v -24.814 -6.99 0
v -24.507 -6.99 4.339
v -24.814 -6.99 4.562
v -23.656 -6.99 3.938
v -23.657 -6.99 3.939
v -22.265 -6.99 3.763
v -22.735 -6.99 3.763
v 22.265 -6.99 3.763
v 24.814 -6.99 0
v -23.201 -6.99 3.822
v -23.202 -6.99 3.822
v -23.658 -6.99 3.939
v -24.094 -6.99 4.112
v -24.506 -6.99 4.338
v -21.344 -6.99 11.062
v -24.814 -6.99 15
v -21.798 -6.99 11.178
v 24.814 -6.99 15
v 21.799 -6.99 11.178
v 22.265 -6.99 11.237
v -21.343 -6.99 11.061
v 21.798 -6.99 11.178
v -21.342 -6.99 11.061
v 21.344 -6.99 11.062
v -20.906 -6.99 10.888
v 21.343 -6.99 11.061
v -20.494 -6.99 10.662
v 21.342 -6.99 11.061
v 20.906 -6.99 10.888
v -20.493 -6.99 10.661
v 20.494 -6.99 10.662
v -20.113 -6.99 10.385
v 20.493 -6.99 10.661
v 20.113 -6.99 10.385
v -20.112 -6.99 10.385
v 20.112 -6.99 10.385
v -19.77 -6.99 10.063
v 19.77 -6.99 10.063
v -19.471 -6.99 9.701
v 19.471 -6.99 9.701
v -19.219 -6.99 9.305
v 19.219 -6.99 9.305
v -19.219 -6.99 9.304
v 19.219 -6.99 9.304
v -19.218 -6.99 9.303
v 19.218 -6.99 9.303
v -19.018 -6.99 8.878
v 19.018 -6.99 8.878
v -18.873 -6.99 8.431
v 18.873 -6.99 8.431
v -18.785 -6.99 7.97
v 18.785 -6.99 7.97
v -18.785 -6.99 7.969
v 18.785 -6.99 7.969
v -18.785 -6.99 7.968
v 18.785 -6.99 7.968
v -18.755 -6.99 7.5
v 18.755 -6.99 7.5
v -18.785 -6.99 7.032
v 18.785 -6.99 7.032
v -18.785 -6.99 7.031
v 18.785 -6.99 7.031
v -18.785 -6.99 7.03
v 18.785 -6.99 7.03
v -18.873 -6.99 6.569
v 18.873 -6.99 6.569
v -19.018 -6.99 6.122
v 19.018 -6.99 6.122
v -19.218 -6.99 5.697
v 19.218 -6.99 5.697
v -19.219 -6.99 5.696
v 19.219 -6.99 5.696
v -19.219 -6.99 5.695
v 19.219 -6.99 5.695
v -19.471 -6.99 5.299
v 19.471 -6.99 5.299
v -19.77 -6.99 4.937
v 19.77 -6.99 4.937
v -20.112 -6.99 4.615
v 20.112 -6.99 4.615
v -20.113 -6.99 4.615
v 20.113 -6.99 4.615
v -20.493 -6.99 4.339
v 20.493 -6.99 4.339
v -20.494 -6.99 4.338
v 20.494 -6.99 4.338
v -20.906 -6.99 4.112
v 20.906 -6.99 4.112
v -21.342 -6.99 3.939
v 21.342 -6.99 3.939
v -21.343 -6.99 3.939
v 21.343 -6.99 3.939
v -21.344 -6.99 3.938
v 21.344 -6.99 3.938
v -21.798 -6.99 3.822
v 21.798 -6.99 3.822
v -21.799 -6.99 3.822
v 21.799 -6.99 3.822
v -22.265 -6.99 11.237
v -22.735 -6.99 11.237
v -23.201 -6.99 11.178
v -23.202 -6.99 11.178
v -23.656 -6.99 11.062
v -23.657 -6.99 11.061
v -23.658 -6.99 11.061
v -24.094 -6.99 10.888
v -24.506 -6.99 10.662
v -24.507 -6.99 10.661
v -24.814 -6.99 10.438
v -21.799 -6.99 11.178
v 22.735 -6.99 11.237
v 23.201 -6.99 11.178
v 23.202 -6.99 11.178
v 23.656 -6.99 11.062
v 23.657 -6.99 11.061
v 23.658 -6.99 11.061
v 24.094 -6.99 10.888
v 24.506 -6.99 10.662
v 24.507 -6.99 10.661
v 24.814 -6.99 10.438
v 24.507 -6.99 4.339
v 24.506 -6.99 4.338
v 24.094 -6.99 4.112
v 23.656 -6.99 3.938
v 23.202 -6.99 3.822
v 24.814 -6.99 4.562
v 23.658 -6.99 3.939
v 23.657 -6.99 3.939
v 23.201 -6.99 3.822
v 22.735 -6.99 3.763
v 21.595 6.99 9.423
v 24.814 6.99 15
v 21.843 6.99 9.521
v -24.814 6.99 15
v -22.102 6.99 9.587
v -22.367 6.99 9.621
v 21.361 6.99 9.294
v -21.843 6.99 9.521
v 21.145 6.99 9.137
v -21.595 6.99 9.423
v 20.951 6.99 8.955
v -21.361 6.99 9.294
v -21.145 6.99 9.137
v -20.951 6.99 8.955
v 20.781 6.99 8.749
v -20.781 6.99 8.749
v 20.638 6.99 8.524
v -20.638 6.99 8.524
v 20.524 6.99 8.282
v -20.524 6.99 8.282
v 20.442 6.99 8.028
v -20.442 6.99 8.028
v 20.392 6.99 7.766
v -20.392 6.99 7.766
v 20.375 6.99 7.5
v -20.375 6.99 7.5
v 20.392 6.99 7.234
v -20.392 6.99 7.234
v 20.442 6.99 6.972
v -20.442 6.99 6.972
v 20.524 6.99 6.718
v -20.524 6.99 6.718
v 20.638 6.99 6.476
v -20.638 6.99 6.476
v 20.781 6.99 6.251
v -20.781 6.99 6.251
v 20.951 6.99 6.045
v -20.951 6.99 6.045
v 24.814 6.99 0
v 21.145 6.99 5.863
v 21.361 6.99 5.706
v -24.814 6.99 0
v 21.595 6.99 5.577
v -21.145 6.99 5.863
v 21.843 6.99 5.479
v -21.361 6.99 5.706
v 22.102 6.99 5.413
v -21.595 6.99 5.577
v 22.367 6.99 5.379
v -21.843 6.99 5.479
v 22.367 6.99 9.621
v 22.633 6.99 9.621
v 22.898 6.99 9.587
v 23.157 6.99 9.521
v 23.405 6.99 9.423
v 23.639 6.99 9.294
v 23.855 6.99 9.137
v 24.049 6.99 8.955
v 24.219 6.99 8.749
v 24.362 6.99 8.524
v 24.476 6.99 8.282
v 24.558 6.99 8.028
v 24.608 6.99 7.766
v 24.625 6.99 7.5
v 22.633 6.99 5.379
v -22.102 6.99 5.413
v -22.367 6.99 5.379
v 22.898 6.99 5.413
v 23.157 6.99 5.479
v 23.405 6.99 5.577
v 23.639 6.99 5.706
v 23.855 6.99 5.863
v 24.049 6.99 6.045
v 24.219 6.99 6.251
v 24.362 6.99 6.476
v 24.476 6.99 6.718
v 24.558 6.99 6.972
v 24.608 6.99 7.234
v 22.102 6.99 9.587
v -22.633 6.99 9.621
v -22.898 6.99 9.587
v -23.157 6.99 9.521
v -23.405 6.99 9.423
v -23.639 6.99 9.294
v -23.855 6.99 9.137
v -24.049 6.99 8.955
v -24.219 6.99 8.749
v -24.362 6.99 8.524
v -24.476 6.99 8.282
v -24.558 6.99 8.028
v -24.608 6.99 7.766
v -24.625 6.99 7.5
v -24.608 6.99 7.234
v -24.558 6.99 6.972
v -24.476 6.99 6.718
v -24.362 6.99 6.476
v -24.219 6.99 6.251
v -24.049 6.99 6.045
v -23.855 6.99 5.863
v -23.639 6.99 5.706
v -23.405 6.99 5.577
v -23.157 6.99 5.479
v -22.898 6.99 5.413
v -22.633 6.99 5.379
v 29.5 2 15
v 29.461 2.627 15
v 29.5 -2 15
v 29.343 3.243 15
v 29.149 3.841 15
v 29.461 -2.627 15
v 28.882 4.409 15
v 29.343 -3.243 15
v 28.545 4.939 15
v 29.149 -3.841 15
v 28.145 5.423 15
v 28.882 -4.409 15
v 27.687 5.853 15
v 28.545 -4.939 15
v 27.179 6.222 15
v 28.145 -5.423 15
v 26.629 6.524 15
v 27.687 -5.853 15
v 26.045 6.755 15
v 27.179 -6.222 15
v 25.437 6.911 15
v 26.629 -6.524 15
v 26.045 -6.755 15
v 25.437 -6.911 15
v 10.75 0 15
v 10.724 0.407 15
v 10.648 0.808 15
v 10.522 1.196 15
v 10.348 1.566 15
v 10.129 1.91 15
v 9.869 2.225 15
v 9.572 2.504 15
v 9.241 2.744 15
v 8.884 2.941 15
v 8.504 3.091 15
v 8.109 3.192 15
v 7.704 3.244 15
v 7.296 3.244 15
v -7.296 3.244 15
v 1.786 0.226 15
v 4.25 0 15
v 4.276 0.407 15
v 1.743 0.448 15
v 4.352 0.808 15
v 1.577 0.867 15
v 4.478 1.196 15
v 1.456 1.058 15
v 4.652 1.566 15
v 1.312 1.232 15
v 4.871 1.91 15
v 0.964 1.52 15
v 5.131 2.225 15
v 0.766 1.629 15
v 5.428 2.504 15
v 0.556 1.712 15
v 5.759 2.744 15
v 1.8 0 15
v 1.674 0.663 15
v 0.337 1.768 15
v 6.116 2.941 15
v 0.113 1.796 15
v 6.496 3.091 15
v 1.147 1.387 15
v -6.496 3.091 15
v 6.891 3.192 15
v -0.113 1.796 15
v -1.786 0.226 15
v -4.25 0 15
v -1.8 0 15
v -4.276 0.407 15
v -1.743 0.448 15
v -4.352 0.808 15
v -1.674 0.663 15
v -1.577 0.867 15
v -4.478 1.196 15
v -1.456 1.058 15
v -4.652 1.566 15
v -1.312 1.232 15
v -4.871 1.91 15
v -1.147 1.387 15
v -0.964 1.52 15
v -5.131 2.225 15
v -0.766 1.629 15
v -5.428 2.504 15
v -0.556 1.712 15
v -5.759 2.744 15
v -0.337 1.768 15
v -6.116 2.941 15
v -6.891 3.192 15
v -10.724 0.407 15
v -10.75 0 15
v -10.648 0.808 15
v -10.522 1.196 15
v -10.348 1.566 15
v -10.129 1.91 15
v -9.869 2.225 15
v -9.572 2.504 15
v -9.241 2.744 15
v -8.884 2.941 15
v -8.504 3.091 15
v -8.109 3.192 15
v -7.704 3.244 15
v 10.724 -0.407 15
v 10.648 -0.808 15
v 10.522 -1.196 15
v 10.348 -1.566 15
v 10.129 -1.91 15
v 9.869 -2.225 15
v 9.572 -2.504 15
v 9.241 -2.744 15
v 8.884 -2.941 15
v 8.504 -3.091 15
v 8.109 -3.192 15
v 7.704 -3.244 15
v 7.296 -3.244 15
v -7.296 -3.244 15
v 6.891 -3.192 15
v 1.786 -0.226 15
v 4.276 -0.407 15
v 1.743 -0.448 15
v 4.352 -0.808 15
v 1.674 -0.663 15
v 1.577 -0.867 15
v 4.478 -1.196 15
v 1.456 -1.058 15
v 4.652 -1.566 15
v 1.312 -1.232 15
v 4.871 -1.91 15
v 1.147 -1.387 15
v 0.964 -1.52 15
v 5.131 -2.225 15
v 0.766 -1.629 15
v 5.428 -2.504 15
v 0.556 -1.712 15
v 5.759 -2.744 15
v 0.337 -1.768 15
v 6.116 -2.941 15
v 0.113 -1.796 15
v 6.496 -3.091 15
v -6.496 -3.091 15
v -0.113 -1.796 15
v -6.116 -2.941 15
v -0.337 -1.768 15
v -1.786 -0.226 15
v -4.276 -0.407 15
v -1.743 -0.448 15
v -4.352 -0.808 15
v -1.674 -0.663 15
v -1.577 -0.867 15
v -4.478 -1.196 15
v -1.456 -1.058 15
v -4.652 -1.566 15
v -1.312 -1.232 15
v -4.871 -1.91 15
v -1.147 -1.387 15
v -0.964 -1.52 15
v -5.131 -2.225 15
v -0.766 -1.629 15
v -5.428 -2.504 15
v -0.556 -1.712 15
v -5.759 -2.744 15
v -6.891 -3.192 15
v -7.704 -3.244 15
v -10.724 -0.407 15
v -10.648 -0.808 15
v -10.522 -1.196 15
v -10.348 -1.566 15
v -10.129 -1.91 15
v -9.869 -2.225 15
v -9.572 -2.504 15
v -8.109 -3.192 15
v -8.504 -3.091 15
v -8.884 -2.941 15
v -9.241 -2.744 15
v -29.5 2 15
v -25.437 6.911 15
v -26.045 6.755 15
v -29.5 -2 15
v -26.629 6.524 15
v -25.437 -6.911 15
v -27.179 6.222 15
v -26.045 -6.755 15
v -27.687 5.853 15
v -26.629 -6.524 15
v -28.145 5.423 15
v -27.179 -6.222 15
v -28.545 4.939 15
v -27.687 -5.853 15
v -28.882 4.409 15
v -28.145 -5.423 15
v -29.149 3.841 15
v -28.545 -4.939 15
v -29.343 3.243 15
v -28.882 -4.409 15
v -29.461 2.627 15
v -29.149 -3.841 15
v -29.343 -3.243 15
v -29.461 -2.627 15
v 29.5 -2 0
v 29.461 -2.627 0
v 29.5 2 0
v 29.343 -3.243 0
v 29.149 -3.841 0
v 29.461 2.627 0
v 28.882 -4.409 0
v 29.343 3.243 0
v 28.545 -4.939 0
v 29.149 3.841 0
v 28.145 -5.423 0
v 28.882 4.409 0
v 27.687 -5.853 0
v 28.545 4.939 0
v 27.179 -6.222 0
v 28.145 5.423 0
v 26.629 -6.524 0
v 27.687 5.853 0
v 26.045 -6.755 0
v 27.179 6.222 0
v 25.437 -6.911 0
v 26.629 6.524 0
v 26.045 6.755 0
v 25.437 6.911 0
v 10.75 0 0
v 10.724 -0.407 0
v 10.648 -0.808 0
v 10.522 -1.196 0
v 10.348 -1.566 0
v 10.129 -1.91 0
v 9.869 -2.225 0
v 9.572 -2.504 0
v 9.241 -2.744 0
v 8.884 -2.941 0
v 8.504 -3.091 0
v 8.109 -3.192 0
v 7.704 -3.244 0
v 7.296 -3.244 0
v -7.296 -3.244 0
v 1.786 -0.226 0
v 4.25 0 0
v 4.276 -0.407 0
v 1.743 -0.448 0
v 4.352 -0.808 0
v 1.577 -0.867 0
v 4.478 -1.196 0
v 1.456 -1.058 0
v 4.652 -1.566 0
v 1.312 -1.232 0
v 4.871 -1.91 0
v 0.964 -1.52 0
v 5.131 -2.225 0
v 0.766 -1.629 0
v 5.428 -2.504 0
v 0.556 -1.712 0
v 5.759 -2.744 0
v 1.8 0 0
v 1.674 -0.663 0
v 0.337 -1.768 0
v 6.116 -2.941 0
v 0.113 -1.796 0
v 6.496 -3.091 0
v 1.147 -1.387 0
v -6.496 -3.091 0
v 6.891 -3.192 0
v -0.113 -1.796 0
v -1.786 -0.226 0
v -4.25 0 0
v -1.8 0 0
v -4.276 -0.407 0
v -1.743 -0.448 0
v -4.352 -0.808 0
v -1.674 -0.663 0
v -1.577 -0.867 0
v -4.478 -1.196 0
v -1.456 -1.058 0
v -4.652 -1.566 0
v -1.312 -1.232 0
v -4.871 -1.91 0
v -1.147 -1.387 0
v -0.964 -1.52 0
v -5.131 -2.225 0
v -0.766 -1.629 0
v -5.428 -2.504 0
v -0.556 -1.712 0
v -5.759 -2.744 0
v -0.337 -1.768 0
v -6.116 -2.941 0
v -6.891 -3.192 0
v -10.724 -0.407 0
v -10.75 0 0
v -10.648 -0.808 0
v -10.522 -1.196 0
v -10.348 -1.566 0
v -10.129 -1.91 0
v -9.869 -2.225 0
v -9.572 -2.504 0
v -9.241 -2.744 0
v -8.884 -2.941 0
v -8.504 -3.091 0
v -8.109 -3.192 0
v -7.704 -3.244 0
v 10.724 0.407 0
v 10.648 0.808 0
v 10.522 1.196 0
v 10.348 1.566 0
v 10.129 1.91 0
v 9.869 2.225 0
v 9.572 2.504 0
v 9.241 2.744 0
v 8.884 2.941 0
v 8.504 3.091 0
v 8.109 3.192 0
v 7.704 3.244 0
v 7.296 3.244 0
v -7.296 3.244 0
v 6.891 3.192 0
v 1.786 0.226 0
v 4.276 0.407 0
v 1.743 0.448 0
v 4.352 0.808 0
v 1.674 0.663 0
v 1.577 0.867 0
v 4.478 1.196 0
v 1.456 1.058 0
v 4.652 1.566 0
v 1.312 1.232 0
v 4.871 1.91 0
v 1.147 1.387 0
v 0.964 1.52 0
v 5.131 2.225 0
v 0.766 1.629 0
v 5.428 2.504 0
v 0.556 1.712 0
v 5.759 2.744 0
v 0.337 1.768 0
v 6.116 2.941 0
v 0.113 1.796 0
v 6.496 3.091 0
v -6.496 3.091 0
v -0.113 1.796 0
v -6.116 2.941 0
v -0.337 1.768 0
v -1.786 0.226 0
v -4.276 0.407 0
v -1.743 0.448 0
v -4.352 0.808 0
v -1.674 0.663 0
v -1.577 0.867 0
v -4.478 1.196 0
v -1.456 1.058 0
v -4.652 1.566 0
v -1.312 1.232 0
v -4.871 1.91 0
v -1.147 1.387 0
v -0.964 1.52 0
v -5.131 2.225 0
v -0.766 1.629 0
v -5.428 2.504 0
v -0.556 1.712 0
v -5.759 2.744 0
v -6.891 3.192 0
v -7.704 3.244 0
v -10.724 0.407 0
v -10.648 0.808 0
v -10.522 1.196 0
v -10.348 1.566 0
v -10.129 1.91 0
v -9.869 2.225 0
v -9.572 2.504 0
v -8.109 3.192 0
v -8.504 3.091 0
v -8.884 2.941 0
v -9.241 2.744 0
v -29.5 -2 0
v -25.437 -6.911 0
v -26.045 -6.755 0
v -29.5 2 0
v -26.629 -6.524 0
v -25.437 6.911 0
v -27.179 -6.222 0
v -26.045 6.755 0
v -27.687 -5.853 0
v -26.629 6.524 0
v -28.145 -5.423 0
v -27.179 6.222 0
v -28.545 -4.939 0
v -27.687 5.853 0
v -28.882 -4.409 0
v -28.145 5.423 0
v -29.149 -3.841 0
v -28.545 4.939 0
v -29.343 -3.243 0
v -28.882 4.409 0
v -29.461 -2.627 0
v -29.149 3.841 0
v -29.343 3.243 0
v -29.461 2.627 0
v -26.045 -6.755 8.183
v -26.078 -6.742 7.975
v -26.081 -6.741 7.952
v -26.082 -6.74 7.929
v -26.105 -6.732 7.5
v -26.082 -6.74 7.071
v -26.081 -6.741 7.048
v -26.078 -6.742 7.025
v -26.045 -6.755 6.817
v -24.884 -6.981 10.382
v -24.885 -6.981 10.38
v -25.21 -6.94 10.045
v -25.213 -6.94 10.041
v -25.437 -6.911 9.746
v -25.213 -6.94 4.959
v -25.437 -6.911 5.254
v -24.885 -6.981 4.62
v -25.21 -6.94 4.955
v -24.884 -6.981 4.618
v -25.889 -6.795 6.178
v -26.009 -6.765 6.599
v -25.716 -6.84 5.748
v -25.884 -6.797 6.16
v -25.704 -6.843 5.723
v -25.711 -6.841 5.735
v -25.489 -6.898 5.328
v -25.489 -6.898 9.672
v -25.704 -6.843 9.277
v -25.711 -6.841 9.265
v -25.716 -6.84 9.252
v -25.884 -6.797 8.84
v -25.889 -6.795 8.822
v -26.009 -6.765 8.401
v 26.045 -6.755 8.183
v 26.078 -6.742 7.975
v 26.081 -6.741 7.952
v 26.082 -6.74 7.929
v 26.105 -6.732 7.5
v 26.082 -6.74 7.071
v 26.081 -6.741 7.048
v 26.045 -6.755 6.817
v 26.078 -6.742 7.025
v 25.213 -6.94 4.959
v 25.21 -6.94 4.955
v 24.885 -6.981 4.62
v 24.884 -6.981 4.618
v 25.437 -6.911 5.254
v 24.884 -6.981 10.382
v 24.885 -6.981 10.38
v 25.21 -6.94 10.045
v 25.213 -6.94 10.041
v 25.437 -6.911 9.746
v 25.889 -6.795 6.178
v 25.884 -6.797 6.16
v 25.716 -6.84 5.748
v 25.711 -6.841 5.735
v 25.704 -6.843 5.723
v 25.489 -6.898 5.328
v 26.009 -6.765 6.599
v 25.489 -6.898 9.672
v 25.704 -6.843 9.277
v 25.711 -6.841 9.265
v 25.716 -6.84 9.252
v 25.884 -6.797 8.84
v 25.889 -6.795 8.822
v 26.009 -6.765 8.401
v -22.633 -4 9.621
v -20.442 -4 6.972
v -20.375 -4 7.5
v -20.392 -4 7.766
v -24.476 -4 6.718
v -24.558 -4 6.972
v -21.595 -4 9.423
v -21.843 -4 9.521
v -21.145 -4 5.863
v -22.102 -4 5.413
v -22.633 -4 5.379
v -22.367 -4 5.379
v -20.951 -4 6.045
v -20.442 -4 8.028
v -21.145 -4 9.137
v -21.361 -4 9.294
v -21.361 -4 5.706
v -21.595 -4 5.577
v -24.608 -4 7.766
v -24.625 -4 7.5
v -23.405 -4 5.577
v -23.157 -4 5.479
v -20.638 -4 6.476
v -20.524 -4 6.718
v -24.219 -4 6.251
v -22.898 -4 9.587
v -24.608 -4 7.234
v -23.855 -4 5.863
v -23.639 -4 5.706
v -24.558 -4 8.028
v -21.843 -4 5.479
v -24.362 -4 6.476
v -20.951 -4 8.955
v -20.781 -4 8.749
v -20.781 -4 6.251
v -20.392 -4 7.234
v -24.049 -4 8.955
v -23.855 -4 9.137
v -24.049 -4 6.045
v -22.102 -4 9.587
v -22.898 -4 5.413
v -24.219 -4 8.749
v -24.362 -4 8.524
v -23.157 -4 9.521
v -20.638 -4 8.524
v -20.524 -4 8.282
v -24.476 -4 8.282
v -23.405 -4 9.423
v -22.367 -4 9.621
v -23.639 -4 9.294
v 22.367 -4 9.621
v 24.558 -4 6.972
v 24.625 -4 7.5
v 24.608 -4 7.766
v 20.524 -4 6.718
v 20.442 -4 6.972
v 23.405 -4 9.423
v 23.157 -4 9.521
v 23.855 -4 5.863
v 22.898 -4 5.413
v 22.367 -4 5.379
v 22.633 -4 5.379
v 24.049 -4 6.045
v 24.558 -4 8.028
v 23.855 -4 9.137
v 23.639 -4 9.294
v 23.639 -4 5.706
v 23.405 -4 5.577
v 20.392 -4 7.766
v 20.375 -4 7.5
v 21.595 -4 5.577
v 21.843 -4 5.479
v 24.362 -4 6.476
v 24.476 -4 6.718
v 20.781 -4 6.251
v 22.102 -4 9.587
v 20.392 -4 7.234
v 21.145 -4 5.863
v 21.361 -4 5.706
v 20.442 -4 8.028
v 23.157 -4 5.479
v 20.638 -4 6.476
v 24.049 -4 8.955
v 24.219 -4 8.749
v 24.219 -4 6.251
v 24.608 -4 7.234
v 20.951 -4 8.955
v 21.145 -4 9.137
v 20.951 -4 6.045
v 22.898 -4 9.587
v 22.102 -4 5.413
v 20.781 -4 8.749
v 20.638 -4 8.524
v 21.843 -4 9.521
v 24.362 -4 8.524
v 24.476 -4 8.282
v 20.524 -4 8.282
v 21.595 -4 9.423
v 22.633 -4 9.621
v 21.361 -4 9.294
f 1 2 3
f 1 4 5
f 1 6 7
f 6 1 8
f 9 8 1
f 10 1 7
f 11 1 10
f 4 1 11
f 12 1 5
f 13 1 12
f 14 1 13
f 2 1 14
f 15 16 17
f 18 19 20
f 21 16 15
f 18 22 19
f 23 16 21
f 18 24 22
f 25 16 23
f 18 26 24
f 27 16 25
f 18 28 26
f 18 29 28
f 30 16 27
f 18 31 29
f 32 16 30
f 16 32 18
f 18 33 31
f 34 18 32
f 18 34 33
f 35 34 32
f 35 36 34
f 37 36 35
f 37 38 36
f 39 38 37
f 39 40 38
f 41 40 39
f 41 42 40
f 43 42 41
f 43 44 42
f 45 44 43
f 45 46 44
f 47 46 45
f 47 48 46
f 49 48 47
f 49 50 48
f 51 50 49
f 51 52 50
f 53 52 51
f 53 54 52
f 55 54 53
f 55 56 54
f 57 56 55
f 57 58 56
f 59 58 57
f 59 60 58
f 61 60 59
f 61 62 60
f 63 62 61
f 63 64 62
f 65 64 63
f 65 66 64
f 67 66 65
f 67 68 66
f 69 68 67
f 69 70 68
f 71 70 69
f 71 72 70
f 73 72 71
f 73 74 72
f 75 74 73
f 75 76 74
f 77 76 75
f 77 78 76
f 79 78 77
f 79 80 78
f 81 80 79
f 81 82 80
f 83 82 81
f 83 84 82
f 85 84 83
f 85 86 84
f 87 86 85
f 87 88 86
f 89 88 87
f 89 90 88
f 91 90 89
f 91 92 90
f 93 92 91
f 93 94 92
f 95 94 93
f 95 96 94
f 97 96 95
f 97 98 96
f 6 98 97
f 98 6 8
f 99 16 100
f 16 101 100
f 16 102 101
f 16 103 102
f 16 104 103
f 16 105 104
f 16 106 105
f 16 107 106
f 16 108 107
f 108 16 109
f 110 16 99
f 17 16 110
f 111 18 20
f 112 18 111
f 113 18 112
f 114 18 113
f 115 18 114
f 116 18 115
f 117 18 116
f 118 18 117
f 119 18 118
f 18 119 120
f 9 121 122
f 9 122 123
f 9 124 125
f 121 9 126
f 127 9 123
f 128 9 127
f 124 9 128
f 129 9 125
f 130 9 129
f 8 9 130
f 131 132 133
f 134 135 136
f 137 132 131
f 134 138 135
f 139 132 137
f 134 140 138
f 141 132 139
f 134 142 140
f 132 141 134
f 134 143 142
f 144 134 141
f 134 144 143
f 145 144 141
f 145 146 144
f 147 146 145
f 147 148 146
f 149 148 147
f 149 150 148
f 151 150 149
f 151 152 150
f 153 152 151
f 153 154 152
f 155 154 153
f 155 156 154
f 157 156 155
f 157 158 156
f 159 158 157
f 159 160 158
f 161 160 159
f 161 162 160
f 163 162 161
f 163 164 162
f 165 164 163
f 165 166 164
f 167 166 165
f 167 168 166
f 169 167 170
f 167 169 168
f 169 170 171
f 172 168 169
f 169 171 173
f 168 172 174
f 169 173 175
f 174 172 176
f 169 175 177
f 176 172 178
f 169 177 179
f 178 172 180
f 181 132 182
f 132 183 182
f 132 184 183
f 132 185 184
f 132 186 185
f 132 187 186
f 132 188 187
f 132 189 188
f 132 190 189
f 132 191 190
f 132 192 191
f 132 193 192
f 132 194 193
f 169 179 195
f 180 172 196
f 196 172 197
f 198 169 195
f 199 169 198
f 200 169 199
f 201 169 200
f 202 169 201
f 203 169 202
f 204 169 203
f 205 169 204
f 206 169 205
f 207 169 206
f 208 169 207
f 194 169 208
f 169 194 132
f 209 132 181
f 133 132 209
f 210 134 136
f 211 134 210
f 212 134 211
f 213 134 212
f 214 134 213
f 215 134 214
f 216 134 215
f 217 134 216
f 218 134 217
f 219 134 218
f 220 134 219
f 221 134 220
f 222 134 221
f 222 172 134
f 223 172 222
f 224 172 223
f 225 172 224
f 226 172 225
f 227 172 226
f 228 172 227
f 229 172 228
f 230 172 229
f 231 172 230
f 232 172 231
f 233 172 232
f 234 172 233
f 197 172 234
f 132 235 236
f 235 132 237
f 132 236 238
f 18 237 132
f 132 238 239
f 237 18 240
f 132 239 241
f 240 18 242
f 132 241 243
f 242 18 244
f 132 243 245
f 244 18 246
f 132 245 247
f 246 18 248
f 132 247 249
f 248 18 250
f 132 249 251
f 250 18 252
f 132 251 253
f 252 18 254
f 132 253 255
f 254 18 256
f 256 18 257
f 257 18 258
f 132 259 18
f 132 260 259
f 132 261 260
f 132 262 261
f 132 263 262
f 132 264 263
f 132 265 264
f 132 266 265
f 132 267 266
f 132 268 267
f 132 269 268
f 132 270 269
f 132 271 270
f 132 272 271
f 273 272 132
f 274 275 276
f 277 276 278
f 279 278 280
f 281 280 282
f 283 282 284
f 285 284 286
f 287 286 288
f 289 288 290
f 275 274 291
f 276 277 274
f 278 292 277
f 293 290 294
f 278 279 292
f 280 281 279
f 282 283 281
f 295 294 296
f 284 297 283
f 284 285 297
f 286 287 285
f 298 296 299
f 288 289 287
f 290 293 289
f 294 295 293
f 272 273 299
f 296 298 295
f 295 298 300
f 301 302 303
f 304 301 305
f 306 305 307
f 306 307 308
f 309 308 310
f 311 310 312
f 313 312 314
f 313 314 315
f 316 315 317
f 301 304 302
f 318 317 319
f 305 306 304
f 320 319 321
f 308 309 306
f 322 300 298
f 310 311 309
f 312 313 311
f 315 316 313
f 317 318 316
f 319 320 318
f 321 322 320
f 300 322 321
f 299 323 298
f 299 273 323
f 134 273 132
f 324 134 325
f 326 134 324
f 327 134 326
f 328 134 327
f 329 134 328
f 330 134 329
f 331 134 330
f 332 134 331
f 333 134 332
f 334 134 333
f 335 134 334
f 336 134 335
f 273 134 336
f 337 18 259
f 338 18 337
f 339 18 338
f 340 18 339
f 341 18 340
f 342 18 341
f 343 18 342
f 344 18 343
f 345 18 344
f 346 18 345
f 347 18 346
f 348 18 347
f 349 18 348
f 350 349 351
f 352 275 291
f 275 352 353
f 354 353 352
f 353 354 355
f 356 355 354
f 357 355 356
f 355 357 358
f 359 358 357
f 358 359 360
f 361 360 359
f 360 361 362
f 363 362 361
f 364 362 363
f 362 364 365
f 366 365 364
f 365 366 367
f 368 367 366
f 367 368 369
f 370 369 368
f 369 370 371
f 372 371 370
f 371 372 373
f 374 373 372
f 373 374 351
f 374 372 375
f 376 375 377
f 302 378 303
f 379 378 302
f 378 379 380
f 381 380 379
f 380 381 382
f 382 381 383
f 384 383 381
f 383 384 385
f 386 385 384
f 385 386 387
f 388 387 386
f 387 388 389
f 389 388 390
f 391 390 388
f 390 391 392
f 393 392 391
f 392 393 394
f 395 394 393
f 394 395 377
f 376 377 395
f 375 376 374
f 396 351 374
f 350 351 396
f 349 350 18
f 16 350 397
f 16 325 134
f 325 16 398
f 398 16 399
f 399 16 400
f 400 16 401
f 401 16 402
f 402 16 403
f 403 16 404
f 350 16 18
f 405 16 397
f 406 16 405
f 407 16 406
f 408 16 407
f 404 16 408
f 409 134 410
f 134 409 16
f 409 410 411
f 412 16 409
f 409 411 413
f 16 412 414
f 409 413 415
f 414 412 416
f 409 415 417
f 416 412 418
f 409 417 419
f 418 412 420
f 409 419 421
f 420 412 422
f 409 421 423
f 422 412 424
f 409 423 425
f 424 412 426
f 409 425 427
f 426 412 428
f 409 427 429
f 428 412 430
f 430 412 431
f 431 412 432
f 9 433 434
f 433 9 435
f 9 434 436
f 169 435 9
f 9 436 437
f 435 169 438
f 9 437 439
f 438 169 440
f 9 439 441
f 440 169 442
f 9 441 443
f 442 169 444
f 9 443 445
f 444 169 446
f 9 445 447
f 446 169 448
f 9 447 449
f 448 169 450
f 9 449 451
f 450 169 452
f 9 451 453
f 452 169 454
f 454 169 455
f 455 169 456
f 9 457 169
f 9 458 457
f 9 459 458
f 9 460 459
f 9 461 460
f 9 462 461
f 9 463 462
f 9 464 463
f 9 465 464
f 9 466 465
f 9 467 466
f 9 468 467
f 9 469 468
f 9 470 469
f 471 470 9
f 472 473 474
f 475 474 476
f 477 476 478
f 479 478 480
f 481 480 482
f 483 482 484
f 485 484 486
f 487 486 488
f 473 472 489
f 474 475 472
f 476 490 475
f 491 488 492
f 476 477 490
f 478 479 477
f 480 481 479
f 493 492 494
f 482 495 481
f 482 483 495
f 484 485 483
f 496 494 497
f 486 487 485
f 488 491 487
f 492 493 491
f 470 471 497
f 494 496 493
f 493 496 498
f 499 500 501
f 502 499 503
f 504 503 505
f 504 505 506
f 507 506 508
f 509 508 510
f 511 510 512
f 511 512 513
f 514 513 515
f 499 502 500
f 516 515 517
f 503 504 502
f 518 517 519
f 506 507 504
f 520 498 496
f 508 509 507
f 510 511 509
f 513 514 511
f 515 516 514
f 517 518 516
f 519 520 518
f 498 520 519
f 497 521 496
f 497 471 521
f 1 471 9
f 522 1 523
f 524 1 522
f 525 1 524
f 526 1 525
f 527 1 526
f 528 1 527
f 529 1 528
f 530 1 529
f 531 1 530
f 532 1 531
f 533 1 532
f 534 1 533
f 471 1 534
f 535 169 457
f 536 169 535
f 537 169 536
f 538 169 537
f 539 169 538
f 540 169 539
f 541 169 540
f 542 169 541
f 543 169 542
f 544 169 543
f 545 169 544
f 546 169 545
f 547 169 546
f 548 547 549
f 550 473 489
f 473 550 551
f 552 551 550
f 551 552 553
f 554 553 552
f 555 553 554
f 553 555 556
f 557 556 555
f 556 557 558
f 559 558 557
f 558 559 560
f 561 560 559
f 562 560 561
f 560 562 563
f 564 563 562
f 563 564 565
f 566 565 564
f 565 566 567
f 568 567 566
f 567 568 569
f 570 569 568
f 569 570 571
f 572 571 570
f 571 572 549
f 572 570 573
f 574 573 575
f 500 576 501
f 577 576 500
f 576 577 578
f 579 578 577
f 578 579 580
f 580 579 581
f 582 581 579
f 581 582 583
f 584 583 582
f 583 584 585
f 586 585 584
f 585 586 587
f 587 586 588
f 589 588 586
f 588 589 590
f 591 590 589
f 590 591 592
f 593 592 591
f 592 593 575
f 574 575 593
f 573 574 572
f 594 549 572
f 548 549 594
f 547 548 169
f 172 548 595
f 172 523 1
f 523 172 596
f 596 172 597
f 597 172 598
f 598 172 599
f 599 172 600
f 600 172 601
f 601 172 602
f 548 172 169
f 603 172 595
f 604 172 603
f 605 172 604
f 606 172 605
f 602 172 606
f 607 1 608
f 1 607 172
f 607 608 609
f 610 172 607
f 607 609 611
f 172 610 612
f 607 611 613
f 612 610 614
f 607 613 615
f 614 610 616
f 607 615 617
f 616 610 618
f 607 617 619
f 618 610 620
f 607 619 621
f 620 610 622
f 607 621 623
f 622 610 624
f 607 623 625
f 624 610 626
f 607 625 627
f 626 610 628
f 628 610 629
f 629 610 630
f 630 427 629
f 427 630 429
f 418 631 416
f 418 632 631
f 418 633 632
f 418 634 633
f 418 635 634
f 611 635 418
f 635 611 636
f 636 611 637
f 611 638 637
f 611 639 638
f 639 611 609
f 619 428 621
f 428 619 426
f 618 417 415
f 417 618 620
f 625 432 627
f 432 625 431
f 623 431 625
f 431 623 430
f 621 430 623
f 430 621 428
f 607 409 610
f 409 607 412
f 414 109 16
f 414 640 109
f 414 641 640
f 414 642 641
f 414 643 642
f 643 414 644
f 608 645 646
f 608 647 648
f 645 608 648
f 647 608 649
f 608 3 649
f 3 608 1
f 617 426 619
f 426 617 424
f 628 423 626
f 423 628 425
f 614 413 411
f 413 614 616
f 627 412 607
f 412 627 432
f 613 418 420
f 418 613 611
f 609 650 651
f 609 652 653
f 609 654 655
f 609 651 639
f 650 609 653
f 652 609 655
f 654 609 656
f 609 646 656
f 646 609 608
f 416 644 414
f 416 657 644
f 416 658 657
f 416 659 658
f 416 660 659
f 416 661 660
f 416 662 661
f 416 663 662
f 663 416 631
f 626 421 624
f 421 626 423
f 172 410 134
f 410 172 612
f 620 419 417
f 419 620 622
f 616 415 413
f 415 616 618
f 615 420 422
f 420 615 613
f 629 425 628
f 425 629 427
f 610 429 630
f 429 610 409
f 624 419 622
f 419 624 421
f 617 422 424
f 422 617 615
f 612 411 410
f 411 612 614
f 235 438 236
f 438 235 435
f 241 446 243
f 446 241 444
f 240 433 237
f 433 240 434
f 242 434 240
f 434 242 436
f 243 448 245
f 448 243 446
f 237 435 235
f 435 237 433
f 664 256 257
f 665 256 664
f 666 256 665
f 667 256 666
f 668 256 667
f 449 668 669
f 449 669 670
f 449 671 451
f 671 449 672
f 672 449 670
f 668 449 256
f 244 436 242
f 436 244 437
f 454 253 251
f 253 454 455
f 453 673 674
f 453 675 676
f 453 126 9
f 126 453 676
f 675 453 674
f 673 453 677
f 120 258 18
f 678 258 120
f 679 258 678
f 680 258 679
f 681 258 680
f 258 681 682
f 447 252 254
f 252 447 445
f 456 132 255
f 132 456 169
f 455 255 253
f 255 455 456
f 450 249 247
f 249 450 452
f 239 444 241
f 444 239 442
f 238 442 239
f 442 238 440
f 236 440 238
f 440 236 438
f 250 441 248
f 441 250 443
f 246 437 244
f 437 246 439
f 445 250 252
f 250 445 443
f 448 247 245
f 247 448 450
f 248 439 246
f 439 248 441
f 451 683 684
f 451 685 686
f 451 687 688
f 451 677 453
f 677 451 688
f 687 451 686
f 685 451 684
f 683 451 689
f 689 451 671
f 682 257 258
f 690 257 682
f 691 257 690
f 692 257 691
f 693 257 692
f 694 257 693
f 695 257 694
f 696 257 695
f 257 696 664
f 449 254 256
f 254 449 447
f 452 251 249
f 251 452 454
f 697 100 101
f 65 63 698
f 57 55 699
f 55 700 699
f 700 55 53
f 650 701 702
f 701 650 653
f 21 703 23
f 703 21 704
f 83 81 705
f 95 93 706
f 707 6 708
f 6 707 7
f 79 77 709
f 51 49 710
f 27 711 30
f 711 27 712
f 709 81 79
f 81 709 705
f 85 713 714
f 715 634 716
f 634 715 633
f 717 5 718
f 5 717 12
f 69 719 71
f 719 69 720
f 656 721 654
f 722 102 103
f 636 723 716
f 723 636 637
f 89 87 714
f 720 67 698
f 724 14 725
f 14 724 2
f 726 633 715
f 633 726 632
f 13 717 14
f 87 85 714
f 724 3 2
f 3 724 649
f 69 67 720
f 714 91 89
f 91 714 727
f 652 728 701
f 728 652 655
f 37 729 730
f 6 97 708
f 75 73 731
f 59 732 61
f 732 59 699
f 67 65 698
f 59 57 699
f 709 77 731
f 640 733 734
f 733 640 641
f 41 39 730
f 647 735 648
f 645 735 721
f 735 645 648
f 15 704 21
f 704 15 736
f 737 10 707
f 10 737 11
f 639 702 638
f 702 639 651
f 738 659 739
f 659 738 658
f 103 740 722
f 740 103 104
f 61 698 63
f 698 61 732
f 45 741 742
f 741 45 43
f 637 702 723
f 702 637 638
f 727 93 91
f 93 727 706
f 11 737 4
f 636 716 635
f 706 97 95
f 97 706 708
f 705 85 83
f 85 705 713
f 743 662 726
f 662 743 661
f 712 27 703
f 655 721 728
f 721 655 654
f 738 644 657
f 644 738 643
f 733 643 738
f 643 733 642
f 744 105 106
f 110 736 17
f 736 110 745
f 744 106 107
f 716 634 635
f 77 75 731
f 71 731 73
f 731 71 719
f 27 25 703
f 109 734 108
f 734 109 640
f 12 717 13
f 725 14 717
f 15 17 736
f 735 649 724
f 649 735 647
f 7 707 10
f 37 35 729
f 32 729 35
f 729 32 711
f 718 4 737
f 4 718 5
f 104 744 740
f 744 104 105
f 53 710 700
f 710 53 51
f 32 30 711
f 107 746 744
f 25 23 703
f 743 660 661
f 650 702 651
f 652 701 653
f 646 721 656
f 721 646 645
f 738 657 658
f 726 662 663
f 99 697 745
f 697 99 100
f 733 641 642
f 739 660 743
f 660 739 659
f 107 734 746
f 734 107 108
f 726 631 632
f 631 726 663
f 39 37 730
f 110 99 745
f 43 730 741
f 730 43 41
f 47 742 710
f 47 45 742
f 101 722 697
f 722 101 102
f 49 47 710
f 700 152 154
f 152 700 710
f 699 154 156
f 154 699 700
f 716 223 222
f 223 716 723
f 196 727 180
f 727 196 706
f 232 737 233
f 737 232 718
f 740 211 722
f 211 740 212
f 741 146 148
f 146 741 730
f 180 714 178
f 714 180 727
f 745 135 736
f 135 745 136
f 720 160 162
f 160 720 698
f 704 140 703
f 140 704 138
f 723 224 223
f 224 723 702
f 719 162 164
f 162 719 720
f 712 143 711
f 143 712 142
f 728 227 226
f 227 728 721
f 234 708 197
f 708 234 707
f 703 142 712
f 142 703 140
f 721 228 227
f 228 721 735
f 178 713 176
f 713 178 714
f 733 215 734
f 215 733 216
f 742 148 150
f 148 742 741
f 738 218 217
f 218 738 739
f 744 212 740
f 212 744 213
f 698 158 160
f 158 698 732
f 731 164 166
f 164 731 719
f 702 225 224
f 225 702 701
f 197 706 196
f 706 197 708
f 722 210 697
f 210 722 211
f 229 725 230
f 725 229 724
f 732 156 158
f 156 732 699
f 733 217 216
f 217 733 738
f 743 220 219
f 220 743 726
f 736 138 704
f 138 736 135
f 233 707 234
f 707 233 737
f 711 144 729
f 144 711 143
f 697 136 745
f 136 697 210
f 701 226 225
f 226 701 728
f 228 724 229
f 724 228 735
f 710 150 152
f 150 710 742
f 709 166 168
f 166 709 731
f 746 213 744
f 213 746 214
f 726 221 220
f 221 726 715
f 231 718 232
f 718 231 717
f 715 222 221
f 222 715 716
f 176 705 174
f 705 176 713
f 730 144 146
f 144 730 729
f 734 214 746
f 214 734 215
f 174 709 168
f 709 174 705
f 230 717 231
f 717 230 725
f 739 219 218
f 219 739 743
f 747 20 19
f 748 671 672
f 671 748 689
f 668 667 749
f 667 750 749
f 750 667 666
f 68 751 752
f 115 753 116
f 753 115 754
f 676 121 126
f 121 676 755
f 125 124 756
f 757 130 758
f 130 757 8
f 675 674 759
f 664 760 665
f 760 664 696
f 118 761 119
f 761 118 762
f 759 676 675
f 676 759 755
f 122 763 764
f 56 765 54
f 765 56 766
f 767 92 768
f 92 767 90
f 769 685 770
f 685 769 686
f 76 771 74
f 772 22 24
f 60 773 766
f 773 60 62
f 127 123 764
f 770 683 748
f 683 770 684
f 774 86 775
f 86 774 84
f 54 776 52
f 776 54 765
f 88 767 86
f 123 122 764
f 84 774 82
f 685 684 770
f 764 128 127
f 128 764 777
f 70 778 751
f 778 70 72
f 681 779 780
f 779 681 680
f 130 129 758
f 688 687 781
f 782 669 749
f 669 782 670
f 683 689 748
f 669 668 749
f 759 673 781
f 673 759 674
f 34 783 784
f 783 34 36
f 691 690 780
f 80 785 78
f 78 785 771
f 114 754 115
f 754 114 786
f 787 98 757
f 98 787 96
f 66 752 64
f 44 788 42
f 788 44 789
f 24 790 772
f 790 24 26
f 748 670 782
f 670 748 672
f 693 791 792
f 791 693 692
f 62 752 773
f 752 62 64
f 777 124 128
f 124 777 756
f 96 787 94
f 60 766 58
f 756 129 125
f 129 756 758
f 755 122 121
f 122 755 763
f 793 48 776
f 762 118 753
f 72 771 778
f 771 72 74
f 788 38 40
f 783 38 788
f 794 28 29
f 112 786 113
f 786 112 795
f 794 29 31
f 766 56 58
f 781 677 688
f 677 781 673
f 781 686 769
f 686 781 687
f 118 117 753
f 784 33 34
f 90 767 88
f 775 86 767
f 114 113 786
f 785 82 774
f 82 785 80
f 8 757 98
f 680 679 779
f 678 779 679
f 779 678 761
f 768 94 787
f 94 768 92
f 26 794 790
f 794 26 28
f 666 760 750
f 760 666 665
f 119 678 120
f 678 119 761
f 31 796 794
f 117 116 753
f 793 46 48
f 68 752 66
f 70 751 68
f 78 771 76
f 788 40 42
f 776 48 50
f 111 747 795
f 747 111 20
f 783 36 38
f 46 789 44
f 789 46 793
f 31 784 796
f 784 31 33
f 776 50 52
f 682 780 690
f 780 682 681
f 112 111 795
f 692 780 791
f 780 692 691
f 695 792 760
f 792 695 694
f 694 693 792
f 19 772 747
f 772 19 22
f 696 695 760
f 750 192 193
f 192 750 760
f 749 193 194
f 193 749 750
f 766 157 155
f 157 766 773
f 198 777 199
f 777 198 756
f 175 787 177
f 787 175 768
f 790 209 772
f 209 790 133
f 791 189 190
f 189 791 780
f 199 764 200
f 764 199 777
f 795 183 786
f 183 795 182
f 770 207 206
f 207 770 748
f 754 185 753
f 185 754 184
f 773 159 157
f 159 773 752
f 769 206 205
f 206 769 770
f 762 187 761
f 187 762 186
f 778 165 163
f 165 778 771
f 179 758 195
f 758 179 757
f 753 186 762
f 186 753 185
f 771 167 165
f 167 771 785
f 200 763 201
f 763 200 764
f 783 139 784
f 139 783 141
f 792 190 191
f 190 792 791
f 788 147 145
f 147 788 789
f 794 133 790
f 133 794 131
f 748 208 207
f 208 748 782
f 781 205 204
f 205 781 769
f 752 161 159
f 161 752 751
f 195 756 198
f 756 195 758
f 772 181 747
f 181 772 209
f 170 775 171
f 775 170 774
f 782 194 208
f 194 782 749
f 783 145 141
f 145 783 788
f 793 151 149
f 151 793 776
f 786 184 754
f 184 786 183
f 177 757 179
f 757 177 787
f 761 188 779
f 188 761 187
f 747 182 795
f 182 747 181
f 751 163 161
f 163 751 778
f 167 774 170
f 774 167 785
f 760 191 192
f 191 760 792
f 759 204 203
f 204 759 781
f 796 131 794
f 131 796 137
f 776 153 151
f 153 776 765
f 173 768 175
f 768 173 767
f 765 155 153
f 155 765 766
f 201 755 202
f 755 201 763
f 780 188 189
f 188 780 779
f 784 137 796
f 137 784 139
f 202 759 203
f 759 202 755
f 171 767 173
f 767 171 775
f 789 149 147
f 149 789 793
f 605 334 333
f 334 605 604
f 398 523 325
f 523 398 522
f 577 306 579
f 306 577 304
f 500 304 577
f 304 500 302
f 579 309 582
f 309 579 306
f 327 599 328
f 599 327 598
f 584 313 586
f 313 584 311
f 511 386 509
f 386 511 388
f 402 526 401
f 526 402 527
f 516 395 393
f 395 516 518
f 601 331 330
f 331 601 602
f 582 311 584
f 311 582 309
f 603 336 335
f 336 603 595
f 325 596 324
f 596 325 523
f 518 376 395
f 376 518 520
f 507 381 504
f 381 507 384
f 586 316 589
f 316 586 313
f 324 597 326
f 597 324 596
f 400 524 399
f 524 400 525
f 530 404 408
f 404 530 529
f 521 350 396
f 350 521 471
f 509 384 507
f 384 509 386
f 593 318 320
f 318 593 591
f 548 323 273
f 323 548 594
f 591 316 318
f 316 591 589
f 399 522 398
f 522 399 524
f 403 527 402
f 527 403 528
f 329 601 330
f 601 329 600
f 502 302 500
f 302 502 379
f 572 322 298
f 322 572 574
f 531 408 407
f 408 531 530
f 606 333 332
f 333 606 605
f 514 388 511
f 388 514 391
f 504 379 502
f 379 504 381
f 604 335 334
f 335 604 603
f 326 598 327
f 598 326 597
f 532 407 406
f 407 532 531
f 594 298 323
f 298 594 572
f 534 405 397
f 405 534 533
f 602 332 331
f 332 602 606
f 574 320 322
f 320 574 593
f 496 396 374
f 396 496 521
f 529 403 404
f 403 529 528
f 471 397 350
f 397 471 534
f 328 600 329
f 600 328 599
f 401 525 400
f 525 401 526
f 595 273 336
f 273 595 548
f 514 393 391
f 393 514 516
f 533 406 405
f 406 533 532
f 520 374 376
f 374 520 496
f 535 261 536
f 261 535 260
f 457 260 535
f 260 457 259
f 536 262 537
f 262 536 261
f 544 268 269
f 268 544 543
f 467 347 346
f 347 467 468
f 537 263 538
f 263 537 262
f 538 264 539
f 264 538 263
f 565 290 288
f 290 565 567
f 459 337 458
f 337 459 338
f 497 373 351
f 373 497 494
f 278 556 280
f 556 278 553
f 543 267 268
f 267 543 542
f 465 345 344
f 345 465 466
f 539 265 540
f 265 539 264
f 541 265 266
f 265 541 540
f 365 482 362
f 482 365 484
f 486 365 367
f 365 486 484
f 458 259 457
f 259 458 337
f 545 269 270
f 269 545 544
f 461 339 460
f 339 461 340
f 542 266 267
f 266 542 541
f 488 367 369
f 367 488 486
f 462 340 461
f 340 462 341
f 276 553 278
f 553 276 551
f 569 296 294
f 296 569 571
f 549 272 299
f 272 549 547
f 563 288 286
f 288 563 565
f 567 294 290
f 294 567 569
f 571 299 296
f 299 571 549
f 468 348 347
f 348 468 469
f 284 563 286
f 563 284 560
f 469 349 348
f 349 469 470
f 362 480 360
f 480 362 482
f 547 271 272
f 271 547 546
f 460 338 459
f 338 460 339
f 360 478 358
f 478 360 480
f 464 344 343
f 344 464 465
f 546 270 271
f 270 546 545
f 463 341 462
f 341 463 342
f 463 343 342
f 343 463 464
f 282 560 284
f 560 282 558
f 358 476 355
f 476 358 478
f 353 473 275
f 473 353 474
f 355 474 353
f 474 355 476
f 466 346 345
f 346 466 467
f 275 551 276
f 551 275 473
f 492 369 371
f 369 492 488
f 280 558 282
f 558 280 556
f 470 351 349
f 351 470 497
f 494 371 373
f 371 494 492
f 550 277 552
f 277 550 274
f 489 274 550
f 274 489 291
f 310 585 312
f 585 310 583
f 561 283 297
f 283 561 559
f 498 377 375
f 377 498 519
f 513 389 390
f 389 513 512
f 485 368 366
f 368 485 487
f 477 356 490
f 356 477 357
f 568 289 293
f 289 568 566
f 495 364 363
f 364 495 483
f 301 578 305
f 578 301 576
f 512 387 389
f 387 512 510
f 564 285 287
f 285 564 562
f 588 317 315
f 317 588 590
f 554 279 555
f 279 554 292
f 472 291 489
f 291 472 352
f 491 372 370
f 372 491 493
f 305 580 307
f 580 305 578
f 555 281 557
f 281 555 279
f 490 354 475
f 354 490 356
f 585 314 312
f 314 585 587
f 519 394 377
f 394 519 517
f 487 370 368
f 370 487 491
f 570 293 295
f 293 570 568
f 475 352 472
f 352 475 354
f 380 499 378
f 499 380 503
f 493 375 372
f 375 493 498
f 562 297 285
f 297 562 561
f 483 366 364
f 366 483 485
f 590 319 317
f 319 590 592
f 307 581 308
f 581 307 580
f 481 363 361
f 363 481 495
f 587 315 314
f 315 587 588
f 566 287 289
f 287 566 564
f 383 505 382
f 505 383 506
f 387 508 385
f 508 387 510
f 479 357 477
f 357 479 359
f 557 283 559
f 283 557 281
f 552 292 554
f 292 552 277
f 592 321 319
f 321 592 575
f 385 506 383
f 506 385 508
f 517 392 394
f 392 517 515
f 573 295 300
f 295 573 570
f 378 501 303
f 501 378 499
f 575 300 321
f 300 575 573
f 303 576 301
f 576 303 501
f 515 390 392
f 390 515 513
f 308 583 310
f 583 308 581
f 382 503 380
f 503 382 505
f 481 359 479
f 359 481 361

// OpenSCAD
$fn = 50;


difference() {
	union() {
		hull() {
			translate(v = [-9.5000000000, 2.0000000000, 0]) {
				cylinder(h = 15, r = 5);
			}
			translate(v = [9.5000000000, 2.0000000000, 0]) {
				cylinder(h = 15, r = 5);
			}
			translate(v = [-9.5000000000, -2.0000000000, 0]) {
				cylinder(h = 15, r = 5);
			}
			translate(v = [9.5000000000, -2.0000000000, 0]) {
				cylinder(h = 15, r = 5);
			}
		}
		translate(v = [-15.0000000000, 0.0000000000, 0]) {
			hull() {
				translate(v = [-9.5000000000, 2.0000000000, 0]) {
					cylinder(h = 15, r = 5);
				}
				translate(v = [9.5000000000, 2.0000000000, 0]) {
					cylinder(h = 15, r = 5);
				}
				translate(v = [-9.5000000000, -2.0000000000, 0]) {
					cylinder(h = 15, r = 5);
				}
				translate(v = [9.5000000000, -2.0000000000, 0]) {
					cylinder(h = 15, r = 5);
				}
			}
		}
		translate(v = [-15.0000000000, 0.0000000000, 0]) {
			hull() {
				translate(v = [-9.5000000000, 2.0000000000, 0]) {
					cylinder(h = 15, r = 5);
				}
				translate(v = [9.5000000000, 2.0000000000, 0]) {
					cylinder(h = 15, r = 5);
				}
				translate(v = [-9.5000000000, -2.0000000000, 0]) {
					cylinder(h = 15, r = 5);
				}
				translate(v = [9.5000000000, -2.0000000000, 0]) {
					cylinder(h = 15, r = 5);
				}
			}
		}
		translate(v = [15.0000000000, 0.0000000000, 0]) {
			hull() {
				translate(v = [-9.5000000000, 2.0000000000, 0]) {
					cylinder(h = 15, r = 5);
				}
				translate(v = [9.5000000000, 2.0000000000, 0]) {
					cylinder(h = 15, r = 5);
				}
				translate(v = [-9.5000000000, -2.0000000000, 0]) {
					cylinder(h = 15, r = 5);
				}
				translate(v = [9.5000000000, -2.0000000000, 0]) {
					cylinder(h = 15, r = 5);
				}
			}
		}
		translate(v = [15.0000000000, 0.0000000000, 0]) {
			hull() {
				translate(v = [-9.5000000000, 2.0000000000, 0]) {
					cylinder(h = 15, r = 5);
				}
				translate(v = [9.5000000000, 2.0000000000, 0]) {
					cylinder(h = 15, r = 5);
				}
				translate(v = [-9.5000000000, -2.0000000000, 0]) {
					cylinder(h = 15, r = 5);
				}
				translate(v = [9.5000000000, -2.0000000000, 0]) {
					cylinder(h = 15, r = 5);
				}
			}
		}
	}
	union() {
		translate(v = [-22.5000000000, -7.0000000000, 7.5000000000]) {
			rotate(a = [90, 0, 0]) {
				difference() {
					union() {
						#translate(v = [0, 0, -14.0000000000]) {
							cylinder(h = 14, r = 2.0000000000);
						}
						#translate(v = [0, 0, -3]) {
							cylinder(h = 3, r1 = 2.1250000000, r2 = 3.7500000000);
						}
						#translate(v = [0, 0, -14.0000000000]) {
							cylinder(h = 14, r = 2.1250000000);
						}
						#translate(v = [0, 0, -14.0000000000]) {
							cylinder(h = 14, r = 2.0000000000);
						}
					}
					union();
				}
			}
		}
		translate(v = [22.5000000000, -7.0000000000, 7.5000000000]) {
			rotate(a = [90, 0, 0]) {
				difference() {
					union() {
						#translate(v = [0, 0, -14.0000000000]) {
							cylinder(h = 14, r = 2.0000000000);
						}
						#translate(v = [0, 0, -3]) {
							cylinder(h = 3, r1 = 2.1250000000, r2 = 3.7500000000);
						}
						#translate(v = [0, 0, -14.0000000000]) {
							cylinder(h = 14, r = 2.1250000000);
						}
						#translate(v = [0, 0, -14.0000000000]) {
							cylinder(h = 14, r = 2.0000000000);
						}
					}
					union();
				}
			}
		}
		translate(v = [-7.5000000000, 0.0000000000, 0]) {
			translate(v = [0, 0, -100]) {
				cylinder(h = 200, r = 3.2500000000);
			}
		}
		translate(v = [7.5000000000, 0.0000000000, 0]) {
			translate(v = [0, 0, -100]) {
				cylinder(h = 200, r = 3.2500000000);
			}
		}
		translate(v = [-7.5000000000, 0.0000000000, 0]) {
			translate(v = [0, 0, -100]) {
				cylinder(h = 200, r = 1.8000000000);
			}
		}
		translate(v = [0, 0, -100]) {
			cylinder(h = 200, r = 1.8000000000);
		}
		translate(v = [7.5000000000, 0.0000000000, 0]) {
			translate(v = [0, 0, -100]) {
				cylinder(h = 200, r = 1.8000000000);
			}
		}
	}
}
